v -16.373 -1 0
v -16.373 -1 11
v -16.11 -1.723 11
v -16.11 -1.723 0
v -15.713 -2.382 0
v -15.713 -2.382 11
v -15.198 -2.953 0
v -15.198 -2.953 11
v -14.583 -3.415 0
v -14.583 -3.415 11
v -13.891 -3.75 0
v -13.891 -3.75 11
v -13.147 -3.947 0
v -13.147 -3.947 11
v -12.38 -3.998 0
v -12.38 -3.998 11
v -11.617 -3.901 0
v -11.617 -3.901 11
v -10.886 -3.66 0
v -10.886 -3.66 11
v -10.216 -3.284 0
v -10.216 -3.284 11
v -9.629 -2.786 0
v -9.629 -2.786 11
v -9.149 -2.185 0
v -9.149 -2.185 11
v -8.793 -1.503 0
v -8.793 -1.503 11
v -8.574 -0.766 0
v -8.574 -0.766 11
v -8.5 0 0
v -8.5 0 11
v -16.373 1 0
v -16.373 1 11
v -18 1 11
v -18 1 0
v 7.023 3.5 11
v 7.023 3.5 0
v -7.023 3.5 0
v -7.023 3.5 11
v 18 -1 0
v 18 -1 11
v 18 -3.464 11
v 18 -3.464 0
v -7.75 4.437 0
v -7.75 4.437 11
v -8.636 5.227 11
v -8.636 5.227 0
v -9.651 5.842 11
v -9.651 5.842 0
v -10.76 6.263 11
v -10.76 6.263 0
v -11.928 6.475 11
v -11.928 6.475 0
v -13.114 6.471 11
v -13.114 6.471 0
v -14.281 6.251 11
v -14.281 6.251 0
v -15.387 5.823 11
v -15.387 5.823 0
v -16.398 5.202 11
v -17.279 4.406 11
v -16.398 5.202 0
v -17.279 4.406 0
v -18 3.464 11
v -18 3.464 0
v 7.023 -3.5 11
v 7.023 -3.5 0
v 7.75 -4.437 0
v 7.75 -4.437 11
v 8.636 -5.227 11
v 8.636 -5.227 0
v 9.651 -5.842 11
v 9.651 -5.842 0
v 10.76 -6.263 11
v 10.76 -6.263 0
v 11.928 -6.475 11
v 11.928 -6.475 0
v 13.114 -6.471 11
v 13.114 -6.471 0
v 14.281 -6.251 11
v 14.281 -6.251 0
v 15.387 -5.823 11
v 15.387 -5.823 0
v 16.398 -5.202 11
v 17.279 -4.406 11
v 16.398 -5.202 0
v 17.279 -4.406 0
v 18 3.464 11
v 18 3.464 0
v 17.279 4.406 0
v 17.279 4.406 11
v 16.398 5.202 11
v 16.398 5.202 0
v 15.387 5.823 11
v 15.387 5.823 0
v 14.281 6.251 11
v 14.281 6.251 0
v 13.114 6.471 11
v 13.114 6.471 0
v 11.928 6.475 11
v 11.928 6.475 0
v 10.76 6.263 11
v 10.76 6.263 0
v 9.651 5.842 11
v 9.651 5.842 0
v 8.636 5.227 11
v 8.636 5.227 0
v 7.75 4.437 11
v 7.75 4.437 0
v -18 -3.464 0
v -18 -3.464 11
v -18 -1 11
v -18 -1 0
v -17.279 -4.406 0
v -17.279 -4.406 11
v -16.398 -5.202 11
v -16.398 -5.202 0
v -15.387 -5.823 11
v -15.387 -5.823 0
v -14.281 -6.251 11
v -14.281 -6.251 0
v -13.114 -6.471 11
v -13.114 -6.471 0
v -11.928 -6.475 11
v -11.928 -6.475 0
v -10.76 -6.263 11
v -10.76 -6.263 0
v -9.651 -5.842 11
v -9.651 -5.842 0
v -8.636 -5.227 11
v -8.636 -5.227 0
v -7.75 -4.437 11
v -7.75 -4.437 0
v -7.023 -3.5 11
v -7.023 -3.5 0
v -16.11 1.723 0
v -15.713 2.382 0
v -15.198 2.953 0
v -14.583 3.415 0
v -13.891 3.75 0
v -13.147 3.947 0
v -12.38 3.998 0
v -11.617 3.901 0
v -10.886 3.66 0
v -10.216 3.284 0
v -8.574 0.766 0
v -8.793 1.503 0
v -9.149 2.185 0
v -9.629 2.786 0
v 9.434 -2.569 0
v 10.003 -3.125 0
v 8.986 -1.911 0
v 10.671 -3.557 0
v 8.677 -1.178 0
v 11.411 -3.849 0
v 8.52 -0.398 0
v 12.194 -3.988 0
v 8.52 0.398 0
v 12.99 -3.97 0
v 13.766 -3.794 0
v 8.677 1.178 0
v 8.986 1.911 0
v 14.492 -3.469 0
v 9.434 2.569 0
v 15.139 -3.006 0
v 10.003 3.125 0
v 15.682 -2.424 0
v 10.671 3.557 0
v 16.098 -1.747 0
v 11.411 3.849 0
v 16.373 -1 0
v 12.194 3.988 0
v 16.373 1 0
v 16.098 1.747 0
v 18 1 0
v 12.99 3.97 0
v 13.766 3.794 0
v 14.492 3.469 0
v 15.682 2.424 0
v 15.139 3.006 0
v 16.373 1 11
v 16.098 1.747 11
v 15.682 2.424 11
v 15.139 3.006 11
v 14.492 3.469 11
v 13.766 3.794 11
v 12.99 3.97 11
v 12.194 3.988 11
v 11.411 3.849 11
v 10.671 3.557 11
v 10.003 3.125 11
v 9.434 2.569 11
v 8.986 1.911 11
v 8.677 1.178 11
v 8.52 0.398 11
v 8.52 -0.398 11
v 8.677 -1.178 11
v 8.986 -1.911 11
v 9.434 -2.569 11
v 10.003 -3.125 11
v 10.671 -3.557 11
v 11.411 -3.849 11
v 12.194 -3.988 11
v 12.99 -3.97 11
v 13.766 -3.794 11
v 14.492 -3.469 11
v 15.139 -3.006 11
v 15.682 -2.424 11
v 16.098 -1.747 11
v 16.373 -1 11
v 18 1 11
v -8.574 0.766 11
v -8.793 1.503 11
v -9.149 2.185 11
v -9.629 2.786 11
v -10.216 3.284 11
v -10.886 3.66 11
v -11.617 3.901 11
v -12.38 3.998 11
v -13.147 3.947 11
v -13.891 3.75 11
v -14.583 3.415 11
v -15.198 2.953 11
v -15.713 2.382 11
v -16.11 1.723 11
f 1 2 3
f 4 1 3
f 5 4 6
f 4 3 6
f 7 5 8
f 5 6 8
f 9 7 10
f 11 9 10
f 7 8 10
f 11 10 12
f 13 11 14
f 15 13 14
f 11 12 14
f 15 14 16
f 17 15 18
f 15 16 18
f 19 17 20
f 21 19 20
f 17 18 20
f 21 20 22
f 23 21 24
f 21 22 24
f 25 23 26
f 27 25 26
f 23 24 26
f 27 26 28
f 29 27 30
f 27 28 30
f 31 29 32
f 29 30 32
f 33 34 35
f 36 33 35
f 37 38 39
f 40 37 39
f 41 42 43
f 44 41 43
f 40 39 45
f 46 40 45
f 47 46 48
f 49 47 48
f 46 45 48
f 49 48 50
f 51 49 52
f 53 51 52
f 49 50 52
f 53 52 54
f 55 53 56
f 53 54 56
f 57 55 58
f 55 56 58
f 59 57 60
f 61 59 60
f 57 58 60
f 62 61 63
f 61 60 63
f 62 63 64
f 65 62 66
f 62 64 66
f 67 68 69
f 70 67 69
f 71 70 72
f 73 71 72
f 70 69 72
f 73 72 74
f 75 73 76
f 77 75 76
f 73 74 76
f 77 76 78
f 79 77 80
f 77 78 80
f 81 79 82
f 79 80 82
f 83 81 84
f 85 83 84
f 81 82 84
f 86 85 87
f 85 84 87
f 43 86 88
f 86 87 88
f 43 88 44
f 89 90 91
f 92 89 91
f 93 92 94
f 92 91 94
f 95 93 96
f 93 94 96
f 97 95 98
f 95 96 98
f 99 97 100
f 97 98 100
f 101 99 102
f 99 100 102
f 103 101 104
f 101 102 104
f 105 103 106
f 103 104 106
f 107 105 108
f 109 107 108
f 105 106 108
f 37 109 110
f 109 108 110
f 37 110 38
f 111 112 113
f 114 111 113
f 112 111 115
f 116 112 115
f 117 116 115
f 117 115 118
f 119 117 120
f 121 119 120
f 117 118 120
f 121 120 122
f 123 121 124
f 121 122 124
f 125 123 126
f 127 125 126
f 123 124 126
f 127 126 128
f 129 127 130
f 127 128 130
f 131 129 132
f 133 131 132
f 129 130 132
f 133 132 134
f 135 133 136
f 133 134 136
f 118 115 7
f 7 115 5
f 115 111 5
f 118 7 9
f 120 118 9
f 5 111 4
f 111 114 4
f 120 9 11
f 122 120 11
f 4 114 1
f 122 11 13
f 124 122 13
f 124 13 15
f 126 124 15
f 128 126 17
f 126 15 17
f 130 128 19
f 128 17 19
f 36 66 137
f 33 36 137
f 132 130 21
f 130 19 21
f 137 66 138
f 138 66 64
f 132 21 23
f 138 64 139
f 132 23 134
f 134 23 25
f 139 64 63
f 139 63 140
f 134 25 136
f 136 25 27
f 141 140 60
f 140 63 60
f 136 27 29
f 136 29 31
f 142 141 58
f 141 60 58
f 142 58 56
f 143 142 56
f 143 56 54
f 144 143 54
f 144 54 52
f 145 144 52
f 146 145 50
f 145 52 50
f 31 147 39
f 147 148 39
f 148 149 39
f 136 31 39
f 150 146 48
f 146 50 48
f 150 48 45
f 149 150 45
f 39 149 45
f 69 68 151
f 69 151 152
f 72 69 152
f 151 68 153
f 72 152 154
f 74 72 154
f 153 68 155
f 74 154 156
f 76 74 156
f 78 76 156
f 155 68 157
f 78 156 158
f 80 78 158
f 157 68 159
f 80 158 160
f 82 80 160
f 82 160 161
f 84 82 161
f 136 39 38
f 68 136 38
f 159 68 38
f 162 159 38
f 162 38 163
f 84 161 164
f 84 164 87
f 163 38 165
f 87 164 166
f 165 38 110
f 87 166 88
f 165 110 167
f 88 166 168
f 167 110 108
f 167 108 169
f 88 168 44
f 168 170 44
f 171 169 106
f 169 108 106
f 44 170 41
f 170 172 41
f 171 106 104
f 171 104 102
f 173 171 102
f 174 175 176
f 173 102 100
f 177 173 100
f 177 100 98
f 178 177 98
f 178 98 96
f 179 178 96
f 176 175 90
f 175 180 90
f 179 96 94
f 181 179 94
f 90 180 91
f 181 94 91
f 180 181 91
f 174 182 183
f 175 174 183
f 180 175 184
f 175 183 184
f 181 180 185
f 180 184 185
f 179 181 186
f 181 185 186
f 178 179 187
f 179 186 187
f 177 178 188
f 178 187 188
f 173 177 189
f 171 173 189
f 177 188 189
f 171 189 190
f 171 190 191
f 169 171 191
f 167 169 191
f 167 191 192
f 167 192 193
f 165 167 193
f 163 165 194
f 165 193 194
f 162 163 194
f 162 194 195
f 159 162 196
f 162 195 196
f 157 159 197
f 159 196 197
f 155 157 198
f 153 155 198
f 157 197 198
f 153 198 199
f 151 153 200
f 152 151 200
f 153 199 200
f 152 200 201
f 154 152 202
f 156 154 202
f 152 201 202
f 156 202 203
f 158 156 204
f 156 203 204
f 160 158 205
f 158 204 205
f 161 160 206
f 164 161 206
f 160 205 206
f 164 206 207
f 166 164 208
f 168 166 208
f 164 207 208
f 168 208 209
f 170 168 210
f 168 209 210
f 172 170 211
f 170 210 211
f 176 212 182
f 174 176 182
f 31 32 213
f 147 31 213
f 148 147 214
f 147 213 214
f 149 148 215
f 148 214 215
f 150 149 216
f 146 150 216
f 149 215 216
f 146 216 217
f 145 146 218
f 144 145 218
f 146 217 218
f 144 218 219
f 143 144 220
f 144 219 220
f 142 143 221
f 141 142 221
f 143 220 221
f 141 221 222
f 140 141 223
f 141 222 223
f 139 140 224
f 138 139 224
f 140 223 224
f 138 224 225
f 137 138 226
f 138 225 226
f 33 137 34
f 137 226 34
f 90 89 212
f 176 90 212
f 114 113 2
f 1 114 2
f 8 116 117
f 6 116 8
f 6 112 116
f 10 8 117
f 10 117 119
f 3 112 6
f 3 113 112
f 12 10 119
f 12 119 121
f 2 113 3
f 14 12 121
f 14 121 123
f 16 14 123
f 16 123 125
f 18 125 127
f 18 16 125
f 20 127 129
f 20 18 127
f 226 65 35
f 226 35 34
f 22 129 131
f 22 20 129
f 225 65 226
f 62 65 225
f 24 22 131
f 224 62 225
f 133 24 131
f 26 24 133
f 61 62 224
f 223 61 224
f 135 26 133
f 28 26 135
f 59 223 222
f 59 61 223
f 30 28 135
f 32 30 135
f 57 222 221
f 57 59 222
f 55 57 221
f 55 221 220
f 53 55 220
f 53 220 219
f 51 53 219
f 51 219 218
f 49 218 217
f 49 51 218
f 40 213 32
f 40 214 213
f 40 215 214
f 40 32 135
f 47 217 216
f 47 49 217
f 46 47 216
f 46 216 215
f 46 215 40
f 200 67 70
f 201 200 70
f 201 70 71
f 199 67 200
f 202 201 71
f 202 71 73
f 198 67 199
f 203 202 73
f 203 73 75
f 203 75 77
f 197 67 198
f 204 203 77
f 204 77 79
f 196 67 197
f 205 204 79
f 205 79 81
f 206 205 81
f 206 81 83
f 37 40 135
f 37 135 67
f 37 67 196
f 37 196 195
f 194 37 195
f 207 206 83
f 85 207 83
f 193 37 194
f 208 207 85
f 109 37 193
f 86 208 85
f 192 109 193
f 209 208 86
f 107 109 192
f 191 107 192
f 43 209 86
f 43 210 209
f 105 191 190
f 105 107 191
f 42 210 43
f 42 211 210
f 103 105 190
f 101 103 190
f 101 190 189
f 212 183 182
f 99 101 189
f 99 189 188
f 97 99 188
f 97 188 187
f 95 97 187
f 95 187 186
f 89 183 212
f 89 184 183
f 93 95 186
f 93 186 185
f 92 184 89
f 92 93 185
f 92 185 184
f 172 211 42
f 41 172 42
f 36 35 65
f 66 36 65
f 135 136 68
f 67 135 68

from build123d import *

# Parameters (mm, degrees)
F1_DEPTH = 11
F3_DEPTH = 11


with BuildPart() as f1:
    # F0 (on Top) → F1 (new body)
    with BuildSketch(Plane.XY):
        with BuildLine():
            Line((-12.5, 3.5), (-7.0227744249, 3.5))
            ThreePointArc((-7.0227744249, 3.5), (-19, 0), (-7.0227744249, -3.5))
            Line((-7.0227744249, -3.5), (-12.5, -3.5))
            Line((-12.5, -3.5), (-12.5, 3.5))
        make_face()
        with BuildLine():
            ThreePointArc((7.0227744249, -3.5), (6, 0), (7.0227744249, 3.5))
            Line((7.0227744249, 3.5), (-7.0227744249, 3.5))
            ThreePointArc((-7.0227744249, 3.5), (-6.2609309093, 1.8231886576), (-6, 0))
            ThreePointArc((-6, 0), (-6.2609309093, -1.8231886576), (-7.0227744249, -3.5))
            Line((-7.0227744249, -3.5), (7.0227744249, -3.5))
        make_face()
        with BuildLine():
            Line((7.0227744249, 3.5), (12.5, 3.5))
            Line((12.5, 3.5), (12.5, -3.5))
            Line((12.5, -3.5), (7.0227744249, -3.5))
            ThreePointArc((7.0227744249, -3.5), (14.3231886576, -6.2390690907), (19, 0))
            ThreePointArc((19, 0), (14.3231886576, 6.2390690907), (7.0227744249, 3.5))
        make_face()
        with BuildLine():
            ThreePointArc((-6, 0), (-6.2609309093, 1.8231886576), (-7.0227744249, 3.5))
            Line((-7.0227744249, 3.5), (-12.5, 3.5))
            Line((-12.5, 3.5), (-12.5, -3.5))
            Line((-12.5, -3.5), (-7.0227744249, -3.5))
            ThreePointArc((-7.0227744249, -3.5), (-6.2609309093, -1.8231886576), (-6, 0))
        make_face()
        with BuildLine():
            Line((12.5, -3.5), (12.5, 3.5))
            Line((12.5, 3.5), (7.0227744249, 3.5))
            ThreePointArc((7.0227744249, 3.5), (6, 0), (7.0227744249, -3.5))
            Line((7.0227744249, -3.5), (12.5, -3.5))
        make_face()
    extrude(amount=F1_DEPTH)

    # F2 (on face) → F3 (cut, through all)
    with BuildSketch(Plane.XY.offset(11)):
        with BuildLine():
            ThreePointArc((-16.3729833462, -1), (-16.5, 0), (-16.3729833462, 1))
            Line((-16.3729833462, 1), (-18, 1))
            Line((-18, 1), (-18, -1))
            Line((-18, -1), (-16.3729833462, -1))
        make_face()
        with BuildLine():
            ThreePointArc((-16.3729833462, -1), (-11.9959828301, -3.9681187851), (-8.5, 0))
            ThreePointArc((-8.5, 0), (-11.9959828301, 3.9681187851), (-16.3729833462, 1))
            Line((-16.3729833462, 1), (-16, 1))
            Line((-16, 1), (-16, -1))
            Line((-16, -1), (-16.3729833462, -1))
        make_face()
        with BuildLine():
            Line((-16, 1), (-16.3729833462, 1))
            ThreePointArc((-16.3729833462, 1), (-16.5, 0), (-16.3729833462, -1))
            Line((-16.3729833462, -1), (-16, -1))
            Line((-16, -1), (-16, 1))
        make_face()
        with BuildLine():
            ThreePointArc((16.5, 0), (16.4681187851, 0.5040171699), (16.3729833462, 1))
            Line((16.3729833462, 1), (16, 1))
            Line((16, 1), (16, -1))
            Line((16, -1), (16.3729833462, -1))
            ThreePointArc((16.3729833462, -1), (16.4681187851, -0.5040171699), (16.5, 0))
        make_face()
        with BuildLine():
            Line((18, -1), (18, 1))
            Line((18, 1), (16.3729833462, 1))
            ThreePointArc((16.3729833462, 1), (16.4681187851, 0.5040171699), (16.5, 0))
            ThreePointArc((16.5, 0), (16.4681187851, -0.5040171699), (16.3729833462, -1))
            Line((16.3729833462, -1), (18, -1))
        make_face()
        with BuildLine():
            Line((16, 1), (16.3729833462, 1))
            ThreePointArc((16.3729833462, 1), (8.5, 0), (16.3729833462, -1))
            Line((16.3729833462, -1), (16, -1))
            Line((16, -1), (16, 1))
        make_face()
        with BuildLine():
            Line((-18, -1), (-18, 1))
            Line((-18, 1), (-18.9226162893, 1))
            ThreePointArc((-18.9226162893, 1), (-19, 0), (-18.9226162893, -1))
            Line((-18.9226162893, -1), (-18, -1))
        make_face()
        with BuildLine():
            Line((18.9226162893, 1), (18, 1))
            Line((18, 1), (18, -1))
            Line((18, -1), (18.9226162893, -1))
            ThreePointArc((18.9226162893, -1), (19, 0), (18.9226162893, 1))
        make_face()
        with BuildLine():
            ThreePointArc((18.9226162893, 1), (18.5872936506, 2.2792226771), (18, 3.4641016151))
            Line((18, 3.4641016151), (18, 1))
            Line((18, 1), (18.9226162893, 1))
        make_face()
        with BuildLine():
            Line((18, -1), (18, -3.4641016151))
            ThreePointArc((18, -3.4641016151), (18.5872936506, -2.2792226771), (18.9226162893, -1))
            Line((18.9226162893, -1), (18, -1))
        make_face()
        with BuildLine():
            Line((-18.9226162893, 1), (-18, 1))
            Line((-18, 1), (-18, 3.4641016151))
            ThreePointArc((-18, 3.4641016151), (-18.5872936506, 2.2792226771), (-18.9226162893, 1))
        make_face()
        with BuildLine():
            Line((-18, -3.4641016151), (-18, -1))
            Line((-18, -1), (-18.9226162893, -1))
            ThreePointArc((-18.9226162893, -1), (-18.5872936506, -2.2792226771), (-18, -3.4641016151))
        make_face()
    extrude(amount=-F3_DEPTH, mode=Mode.SUBTRACT)


solid = f1.part
